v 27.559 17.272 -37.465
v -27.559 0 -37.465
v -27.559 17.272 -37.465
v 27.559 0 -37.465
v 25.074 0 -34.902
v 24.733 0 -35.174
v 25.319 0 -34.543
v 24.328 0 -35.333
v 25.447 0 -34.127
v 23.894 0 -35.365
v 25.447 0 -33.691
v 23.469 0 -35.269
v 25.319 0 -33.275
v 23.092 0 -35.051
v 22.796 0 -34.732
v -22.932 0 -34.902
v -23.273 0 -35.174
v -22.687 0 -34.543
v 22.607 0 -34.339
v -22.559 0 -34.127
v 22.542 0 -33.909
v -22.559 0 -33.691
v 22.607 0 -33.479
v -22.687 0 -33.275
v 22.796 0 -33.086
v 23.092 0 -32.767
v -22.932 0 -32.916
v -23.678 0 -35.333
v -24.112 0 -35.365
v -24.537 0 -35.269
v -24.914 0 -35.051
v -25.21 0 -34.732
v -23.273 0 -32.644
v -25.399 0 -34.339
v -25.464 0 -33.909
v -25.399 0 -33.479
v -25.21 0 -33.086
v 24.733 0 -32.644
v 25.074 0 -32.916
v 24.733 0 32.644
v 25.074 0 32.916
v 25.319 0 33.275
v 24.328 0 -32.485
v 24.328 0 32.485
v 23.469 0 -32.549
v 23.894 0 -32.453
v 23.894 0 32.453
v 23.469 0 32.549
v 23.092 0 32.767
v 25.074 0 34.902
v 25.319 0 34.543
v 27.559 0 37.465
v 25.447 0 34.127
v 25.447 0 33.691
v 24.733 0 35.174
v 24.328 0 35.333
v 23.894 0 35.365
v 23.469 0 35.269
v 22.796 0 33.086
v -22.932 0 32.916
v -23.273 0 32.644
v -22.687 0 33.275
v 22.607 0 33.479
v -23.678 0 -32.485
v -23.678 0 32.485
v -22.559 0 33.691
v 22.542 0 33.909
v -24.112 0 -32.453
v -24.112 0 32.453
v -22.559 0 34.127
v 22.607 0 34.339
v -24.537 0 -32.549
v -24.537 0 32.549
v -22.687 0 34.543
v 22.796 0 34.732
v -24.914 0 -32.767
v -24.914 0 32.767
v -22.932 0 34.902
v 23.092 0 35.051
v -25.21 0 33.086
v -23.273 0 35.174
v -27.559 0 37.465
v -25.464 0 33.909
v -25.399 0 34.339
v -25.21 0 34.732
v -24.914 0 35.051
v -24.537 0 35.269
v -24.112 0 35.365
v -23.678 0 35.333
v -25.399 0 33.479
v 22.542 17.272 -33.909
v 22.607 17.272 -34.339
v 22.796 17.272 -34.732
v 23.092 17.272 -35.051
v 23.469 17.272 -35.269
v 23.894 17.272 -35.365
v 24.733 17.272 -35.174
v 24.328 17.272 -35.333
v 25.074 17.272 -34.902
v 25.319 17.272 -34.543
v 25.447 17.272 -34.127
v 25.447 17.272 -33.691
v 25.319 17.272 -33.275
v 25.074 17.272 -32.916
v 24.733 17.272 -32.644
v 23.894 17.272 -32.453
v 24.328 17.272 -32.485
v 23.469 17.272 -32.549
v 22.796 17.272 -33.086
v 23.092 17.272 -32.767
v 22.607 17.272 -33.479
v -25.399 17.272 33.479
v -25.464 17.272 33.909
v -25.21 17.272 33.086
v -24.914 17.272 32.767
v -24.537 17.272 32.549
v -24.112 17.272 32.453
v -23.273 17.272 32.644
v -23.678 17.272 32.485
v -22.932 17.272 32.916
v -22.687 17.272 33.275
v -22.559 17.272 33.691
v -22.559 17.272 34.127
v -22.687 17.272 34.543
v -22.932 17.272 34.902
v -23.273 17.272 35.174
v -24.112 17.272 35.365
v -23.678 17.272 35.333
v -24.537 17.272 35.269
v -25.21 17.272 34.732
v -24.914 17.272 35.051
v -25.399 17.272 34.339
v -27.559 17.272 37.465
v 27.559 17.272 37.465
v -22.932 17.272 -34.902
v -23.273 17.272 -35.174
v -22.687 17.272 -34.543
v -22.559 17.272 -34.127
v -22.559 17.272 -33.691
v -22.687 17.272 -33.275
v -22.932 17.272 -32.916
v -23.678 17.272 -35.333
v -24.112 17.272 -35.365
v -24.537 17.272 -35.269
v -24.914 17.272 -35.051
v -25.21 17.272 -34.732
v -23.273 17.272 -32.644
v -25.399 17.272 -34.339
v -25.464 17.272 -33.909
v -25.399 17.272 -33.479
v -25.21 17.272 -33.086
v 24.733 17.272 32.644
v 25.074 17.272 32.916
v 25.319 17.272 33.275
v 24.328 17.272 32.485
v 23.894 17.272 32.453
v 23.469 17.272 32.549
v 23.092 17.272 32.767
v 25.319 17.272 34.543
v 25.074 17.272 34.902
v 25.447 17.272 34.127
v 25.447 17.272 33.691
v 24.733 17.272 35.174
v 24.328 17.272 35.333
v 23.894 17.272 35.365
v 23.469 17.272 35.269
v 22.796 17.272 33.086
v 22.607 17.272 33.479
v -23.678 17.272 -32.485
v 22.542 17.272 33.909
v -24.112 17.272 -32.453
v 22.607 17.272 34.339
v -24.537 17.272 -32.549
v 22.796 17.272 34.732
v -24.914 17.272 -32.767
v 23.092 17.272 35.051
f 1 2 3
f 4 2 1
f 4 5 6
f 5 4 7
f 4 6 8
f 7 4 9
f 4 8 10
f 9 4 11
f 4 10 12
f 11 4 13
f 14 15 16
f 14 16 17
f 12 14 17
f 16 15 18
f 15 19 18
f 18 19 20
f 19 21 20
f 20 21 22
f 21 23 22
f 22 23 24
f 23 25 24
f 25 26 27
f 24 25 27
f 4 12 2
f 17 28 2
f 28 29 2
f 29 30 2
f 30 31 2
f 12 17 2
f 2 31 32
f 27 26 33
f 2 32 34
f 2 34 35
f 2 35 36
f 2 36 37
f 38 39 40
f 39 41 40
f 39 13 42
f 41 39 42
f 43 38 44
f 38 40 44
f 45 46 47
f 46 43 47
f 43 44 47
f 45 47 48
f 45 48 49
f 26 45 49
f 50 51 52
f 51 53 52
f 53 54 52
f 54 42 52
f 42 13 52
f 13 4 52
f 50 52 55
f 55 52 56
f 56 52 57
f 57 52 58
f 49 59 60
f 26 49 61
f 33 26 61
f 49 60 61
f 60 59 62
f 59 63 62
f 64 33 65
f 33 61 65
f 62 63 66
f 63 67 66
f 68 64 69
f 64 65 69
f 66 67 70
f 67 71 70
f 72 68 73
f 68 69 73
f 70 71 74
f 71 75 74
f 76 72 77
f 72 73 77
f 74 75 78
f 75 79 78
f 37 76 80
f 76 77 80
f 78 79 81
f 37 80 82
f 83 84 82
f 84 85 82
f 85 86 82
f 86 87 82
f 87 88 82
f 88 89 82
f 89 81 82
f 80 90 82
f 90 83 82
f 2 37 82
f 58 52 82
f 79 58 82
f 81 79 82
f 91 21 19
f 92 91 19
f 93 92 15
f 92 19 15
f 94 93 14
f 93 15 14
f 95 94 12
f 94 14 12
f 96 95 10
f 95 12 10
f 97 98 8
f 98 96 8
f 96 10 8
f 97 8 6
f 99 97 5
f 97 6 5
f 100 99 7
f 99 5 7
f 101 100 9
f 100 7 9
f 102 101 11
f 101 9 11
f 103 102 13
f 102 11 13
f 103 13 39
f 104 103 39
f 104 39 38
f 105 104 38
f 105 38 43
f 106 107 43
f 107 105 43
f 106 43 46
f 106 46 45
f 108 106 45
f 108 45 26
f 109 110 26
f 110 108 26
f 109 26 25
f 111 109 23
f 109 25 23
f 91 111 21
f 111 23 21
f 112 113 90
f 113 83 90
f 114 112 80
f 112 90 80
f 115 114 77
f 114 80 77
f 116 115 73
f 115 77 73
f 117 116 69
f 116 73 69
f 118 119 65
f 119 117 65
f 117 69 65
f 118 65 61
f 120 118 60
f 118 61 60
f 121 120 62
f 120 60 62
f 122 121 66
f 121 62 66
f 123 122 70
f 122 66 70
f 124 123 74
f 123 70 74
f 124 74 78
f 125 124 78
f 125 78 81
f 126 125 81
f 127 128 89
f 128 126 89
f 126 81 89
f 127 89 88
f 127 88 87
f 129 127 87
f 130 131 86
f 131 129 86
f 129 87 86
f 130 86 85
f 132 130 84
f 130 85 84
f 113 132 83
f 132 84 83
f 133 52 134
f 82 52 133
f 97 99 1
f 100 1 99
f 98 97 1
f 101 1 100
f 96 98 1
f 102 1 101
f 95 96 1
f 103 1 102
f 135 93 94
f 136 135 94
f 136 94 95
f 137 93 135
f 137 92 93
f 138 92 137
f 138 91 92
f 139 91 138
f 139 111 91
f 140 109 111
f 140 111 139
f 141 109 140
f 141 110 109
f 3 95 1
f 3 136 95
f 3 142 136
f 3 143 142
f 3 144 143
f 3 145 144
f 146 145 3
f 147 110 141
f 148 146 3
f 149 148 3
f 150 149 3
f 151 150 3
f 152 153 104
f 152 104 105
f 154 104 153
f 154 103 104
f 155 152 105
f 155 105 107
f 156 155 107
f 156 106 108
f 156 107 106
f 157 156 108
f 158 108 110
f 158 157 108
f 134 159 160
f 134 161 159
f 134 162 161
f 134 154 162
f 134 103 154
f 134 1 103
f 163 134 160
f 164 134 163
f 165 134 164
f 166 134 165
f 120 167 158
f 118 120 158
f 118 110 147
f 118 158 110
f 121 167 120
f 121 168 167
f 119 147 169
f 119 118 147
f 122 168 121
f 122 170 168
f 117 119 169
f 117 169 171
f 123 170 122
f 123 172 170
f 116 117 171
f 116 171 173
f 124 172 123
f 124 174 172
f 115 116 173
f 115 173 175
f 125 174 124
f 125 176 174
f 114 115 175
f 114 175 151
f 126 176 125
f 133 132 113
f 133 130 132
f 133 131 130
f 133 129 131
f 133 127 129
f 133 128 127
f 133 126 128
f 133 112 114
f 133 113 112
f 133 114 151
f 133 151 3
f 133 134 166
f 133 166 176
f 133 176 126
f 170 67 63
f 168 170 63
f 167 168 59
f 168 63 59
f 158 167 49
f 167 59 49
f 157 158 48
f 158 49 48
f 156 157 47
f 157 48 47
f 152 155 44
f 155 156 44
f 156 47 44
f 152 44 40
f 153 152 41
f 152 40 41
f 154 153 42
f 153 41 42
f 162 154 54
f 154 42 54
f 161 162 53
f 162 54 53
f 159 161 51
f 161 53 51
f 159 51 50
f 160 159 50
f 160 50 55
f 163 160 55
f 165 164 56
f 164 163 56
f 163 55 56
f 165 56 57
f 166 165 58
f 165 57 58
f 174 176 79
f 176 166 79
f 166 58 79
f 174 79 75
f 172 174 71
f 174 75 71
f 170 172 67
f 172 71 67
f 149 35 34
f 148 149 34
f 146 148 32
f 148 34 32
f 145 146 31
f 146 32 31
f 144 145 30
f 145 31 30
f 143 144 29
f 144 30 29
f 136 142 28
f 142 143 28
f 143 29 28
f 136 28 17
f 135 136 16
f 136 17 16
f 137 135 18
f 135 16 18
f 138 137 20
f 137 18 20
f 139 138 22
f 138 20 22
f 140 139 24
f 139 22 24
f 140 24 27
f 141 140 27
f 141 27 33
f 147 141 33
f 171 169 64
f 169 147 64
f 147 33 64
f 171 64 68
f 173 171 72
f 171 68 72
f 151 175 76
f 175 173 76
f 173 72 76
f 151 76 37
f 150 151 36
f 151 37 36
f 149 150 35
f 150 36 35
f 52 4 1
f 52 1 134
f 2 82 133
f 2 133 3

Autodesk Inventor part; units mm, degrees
ref_plane "YZ Plane" through (0, 0, 0) normal (1, 0, 0) x (0, 1, 0)
ref_plane "XZ Plane" through (0, 0, 0) normal (0, 1, 0) x (-1, 0, 0)
ref_plane "XY Plane" through (0, 0, 0) normal (0, 0, 1) x (1, 0, 0)
sketch "Sketch1" plane through (0, 0, 0) normal (0, 1, 0) x (-1, 0, 0)
  line L0 (27.559, -37.465) -> (-27.559, -37.465)
  line L1 (-27.559, -37.465) -> (-27.559, 37.465)
  line L2 (-27.559, 37.465) -> (27.559, 37.465)
  line L3 (27.559, 37.465) -> (27.559, -37.465)
  circle A0 centre (24.003, -33.909) radius 1.4605
  circle A1 centre (-24.003, -33.909) radius 1.4605
  circle A2 centre (-24.003, 33.909) radius 1.4605
  circle A3 centre (24.003, 33.909) radius 1.4605
  point P0 (0, 0)
  point P1 (0, -37.465)
  point P2 (27.559, 0)
  dimension "d0" = 55.118
  dimension "d1" = 74.93
  dimension "d2" = 2.921
  dimension "d3" = 3.556
  dimension "d4" = 3.556
  dimension "d5" = 3.556
  dimension "d6" = 3.556
extrude "Extrusion1" add sketch "Sketch1" along normal blind 17.272
equation "\"d5\" = d3"
equation "\"d6\" = d4"
properties part number "Relay Board"
